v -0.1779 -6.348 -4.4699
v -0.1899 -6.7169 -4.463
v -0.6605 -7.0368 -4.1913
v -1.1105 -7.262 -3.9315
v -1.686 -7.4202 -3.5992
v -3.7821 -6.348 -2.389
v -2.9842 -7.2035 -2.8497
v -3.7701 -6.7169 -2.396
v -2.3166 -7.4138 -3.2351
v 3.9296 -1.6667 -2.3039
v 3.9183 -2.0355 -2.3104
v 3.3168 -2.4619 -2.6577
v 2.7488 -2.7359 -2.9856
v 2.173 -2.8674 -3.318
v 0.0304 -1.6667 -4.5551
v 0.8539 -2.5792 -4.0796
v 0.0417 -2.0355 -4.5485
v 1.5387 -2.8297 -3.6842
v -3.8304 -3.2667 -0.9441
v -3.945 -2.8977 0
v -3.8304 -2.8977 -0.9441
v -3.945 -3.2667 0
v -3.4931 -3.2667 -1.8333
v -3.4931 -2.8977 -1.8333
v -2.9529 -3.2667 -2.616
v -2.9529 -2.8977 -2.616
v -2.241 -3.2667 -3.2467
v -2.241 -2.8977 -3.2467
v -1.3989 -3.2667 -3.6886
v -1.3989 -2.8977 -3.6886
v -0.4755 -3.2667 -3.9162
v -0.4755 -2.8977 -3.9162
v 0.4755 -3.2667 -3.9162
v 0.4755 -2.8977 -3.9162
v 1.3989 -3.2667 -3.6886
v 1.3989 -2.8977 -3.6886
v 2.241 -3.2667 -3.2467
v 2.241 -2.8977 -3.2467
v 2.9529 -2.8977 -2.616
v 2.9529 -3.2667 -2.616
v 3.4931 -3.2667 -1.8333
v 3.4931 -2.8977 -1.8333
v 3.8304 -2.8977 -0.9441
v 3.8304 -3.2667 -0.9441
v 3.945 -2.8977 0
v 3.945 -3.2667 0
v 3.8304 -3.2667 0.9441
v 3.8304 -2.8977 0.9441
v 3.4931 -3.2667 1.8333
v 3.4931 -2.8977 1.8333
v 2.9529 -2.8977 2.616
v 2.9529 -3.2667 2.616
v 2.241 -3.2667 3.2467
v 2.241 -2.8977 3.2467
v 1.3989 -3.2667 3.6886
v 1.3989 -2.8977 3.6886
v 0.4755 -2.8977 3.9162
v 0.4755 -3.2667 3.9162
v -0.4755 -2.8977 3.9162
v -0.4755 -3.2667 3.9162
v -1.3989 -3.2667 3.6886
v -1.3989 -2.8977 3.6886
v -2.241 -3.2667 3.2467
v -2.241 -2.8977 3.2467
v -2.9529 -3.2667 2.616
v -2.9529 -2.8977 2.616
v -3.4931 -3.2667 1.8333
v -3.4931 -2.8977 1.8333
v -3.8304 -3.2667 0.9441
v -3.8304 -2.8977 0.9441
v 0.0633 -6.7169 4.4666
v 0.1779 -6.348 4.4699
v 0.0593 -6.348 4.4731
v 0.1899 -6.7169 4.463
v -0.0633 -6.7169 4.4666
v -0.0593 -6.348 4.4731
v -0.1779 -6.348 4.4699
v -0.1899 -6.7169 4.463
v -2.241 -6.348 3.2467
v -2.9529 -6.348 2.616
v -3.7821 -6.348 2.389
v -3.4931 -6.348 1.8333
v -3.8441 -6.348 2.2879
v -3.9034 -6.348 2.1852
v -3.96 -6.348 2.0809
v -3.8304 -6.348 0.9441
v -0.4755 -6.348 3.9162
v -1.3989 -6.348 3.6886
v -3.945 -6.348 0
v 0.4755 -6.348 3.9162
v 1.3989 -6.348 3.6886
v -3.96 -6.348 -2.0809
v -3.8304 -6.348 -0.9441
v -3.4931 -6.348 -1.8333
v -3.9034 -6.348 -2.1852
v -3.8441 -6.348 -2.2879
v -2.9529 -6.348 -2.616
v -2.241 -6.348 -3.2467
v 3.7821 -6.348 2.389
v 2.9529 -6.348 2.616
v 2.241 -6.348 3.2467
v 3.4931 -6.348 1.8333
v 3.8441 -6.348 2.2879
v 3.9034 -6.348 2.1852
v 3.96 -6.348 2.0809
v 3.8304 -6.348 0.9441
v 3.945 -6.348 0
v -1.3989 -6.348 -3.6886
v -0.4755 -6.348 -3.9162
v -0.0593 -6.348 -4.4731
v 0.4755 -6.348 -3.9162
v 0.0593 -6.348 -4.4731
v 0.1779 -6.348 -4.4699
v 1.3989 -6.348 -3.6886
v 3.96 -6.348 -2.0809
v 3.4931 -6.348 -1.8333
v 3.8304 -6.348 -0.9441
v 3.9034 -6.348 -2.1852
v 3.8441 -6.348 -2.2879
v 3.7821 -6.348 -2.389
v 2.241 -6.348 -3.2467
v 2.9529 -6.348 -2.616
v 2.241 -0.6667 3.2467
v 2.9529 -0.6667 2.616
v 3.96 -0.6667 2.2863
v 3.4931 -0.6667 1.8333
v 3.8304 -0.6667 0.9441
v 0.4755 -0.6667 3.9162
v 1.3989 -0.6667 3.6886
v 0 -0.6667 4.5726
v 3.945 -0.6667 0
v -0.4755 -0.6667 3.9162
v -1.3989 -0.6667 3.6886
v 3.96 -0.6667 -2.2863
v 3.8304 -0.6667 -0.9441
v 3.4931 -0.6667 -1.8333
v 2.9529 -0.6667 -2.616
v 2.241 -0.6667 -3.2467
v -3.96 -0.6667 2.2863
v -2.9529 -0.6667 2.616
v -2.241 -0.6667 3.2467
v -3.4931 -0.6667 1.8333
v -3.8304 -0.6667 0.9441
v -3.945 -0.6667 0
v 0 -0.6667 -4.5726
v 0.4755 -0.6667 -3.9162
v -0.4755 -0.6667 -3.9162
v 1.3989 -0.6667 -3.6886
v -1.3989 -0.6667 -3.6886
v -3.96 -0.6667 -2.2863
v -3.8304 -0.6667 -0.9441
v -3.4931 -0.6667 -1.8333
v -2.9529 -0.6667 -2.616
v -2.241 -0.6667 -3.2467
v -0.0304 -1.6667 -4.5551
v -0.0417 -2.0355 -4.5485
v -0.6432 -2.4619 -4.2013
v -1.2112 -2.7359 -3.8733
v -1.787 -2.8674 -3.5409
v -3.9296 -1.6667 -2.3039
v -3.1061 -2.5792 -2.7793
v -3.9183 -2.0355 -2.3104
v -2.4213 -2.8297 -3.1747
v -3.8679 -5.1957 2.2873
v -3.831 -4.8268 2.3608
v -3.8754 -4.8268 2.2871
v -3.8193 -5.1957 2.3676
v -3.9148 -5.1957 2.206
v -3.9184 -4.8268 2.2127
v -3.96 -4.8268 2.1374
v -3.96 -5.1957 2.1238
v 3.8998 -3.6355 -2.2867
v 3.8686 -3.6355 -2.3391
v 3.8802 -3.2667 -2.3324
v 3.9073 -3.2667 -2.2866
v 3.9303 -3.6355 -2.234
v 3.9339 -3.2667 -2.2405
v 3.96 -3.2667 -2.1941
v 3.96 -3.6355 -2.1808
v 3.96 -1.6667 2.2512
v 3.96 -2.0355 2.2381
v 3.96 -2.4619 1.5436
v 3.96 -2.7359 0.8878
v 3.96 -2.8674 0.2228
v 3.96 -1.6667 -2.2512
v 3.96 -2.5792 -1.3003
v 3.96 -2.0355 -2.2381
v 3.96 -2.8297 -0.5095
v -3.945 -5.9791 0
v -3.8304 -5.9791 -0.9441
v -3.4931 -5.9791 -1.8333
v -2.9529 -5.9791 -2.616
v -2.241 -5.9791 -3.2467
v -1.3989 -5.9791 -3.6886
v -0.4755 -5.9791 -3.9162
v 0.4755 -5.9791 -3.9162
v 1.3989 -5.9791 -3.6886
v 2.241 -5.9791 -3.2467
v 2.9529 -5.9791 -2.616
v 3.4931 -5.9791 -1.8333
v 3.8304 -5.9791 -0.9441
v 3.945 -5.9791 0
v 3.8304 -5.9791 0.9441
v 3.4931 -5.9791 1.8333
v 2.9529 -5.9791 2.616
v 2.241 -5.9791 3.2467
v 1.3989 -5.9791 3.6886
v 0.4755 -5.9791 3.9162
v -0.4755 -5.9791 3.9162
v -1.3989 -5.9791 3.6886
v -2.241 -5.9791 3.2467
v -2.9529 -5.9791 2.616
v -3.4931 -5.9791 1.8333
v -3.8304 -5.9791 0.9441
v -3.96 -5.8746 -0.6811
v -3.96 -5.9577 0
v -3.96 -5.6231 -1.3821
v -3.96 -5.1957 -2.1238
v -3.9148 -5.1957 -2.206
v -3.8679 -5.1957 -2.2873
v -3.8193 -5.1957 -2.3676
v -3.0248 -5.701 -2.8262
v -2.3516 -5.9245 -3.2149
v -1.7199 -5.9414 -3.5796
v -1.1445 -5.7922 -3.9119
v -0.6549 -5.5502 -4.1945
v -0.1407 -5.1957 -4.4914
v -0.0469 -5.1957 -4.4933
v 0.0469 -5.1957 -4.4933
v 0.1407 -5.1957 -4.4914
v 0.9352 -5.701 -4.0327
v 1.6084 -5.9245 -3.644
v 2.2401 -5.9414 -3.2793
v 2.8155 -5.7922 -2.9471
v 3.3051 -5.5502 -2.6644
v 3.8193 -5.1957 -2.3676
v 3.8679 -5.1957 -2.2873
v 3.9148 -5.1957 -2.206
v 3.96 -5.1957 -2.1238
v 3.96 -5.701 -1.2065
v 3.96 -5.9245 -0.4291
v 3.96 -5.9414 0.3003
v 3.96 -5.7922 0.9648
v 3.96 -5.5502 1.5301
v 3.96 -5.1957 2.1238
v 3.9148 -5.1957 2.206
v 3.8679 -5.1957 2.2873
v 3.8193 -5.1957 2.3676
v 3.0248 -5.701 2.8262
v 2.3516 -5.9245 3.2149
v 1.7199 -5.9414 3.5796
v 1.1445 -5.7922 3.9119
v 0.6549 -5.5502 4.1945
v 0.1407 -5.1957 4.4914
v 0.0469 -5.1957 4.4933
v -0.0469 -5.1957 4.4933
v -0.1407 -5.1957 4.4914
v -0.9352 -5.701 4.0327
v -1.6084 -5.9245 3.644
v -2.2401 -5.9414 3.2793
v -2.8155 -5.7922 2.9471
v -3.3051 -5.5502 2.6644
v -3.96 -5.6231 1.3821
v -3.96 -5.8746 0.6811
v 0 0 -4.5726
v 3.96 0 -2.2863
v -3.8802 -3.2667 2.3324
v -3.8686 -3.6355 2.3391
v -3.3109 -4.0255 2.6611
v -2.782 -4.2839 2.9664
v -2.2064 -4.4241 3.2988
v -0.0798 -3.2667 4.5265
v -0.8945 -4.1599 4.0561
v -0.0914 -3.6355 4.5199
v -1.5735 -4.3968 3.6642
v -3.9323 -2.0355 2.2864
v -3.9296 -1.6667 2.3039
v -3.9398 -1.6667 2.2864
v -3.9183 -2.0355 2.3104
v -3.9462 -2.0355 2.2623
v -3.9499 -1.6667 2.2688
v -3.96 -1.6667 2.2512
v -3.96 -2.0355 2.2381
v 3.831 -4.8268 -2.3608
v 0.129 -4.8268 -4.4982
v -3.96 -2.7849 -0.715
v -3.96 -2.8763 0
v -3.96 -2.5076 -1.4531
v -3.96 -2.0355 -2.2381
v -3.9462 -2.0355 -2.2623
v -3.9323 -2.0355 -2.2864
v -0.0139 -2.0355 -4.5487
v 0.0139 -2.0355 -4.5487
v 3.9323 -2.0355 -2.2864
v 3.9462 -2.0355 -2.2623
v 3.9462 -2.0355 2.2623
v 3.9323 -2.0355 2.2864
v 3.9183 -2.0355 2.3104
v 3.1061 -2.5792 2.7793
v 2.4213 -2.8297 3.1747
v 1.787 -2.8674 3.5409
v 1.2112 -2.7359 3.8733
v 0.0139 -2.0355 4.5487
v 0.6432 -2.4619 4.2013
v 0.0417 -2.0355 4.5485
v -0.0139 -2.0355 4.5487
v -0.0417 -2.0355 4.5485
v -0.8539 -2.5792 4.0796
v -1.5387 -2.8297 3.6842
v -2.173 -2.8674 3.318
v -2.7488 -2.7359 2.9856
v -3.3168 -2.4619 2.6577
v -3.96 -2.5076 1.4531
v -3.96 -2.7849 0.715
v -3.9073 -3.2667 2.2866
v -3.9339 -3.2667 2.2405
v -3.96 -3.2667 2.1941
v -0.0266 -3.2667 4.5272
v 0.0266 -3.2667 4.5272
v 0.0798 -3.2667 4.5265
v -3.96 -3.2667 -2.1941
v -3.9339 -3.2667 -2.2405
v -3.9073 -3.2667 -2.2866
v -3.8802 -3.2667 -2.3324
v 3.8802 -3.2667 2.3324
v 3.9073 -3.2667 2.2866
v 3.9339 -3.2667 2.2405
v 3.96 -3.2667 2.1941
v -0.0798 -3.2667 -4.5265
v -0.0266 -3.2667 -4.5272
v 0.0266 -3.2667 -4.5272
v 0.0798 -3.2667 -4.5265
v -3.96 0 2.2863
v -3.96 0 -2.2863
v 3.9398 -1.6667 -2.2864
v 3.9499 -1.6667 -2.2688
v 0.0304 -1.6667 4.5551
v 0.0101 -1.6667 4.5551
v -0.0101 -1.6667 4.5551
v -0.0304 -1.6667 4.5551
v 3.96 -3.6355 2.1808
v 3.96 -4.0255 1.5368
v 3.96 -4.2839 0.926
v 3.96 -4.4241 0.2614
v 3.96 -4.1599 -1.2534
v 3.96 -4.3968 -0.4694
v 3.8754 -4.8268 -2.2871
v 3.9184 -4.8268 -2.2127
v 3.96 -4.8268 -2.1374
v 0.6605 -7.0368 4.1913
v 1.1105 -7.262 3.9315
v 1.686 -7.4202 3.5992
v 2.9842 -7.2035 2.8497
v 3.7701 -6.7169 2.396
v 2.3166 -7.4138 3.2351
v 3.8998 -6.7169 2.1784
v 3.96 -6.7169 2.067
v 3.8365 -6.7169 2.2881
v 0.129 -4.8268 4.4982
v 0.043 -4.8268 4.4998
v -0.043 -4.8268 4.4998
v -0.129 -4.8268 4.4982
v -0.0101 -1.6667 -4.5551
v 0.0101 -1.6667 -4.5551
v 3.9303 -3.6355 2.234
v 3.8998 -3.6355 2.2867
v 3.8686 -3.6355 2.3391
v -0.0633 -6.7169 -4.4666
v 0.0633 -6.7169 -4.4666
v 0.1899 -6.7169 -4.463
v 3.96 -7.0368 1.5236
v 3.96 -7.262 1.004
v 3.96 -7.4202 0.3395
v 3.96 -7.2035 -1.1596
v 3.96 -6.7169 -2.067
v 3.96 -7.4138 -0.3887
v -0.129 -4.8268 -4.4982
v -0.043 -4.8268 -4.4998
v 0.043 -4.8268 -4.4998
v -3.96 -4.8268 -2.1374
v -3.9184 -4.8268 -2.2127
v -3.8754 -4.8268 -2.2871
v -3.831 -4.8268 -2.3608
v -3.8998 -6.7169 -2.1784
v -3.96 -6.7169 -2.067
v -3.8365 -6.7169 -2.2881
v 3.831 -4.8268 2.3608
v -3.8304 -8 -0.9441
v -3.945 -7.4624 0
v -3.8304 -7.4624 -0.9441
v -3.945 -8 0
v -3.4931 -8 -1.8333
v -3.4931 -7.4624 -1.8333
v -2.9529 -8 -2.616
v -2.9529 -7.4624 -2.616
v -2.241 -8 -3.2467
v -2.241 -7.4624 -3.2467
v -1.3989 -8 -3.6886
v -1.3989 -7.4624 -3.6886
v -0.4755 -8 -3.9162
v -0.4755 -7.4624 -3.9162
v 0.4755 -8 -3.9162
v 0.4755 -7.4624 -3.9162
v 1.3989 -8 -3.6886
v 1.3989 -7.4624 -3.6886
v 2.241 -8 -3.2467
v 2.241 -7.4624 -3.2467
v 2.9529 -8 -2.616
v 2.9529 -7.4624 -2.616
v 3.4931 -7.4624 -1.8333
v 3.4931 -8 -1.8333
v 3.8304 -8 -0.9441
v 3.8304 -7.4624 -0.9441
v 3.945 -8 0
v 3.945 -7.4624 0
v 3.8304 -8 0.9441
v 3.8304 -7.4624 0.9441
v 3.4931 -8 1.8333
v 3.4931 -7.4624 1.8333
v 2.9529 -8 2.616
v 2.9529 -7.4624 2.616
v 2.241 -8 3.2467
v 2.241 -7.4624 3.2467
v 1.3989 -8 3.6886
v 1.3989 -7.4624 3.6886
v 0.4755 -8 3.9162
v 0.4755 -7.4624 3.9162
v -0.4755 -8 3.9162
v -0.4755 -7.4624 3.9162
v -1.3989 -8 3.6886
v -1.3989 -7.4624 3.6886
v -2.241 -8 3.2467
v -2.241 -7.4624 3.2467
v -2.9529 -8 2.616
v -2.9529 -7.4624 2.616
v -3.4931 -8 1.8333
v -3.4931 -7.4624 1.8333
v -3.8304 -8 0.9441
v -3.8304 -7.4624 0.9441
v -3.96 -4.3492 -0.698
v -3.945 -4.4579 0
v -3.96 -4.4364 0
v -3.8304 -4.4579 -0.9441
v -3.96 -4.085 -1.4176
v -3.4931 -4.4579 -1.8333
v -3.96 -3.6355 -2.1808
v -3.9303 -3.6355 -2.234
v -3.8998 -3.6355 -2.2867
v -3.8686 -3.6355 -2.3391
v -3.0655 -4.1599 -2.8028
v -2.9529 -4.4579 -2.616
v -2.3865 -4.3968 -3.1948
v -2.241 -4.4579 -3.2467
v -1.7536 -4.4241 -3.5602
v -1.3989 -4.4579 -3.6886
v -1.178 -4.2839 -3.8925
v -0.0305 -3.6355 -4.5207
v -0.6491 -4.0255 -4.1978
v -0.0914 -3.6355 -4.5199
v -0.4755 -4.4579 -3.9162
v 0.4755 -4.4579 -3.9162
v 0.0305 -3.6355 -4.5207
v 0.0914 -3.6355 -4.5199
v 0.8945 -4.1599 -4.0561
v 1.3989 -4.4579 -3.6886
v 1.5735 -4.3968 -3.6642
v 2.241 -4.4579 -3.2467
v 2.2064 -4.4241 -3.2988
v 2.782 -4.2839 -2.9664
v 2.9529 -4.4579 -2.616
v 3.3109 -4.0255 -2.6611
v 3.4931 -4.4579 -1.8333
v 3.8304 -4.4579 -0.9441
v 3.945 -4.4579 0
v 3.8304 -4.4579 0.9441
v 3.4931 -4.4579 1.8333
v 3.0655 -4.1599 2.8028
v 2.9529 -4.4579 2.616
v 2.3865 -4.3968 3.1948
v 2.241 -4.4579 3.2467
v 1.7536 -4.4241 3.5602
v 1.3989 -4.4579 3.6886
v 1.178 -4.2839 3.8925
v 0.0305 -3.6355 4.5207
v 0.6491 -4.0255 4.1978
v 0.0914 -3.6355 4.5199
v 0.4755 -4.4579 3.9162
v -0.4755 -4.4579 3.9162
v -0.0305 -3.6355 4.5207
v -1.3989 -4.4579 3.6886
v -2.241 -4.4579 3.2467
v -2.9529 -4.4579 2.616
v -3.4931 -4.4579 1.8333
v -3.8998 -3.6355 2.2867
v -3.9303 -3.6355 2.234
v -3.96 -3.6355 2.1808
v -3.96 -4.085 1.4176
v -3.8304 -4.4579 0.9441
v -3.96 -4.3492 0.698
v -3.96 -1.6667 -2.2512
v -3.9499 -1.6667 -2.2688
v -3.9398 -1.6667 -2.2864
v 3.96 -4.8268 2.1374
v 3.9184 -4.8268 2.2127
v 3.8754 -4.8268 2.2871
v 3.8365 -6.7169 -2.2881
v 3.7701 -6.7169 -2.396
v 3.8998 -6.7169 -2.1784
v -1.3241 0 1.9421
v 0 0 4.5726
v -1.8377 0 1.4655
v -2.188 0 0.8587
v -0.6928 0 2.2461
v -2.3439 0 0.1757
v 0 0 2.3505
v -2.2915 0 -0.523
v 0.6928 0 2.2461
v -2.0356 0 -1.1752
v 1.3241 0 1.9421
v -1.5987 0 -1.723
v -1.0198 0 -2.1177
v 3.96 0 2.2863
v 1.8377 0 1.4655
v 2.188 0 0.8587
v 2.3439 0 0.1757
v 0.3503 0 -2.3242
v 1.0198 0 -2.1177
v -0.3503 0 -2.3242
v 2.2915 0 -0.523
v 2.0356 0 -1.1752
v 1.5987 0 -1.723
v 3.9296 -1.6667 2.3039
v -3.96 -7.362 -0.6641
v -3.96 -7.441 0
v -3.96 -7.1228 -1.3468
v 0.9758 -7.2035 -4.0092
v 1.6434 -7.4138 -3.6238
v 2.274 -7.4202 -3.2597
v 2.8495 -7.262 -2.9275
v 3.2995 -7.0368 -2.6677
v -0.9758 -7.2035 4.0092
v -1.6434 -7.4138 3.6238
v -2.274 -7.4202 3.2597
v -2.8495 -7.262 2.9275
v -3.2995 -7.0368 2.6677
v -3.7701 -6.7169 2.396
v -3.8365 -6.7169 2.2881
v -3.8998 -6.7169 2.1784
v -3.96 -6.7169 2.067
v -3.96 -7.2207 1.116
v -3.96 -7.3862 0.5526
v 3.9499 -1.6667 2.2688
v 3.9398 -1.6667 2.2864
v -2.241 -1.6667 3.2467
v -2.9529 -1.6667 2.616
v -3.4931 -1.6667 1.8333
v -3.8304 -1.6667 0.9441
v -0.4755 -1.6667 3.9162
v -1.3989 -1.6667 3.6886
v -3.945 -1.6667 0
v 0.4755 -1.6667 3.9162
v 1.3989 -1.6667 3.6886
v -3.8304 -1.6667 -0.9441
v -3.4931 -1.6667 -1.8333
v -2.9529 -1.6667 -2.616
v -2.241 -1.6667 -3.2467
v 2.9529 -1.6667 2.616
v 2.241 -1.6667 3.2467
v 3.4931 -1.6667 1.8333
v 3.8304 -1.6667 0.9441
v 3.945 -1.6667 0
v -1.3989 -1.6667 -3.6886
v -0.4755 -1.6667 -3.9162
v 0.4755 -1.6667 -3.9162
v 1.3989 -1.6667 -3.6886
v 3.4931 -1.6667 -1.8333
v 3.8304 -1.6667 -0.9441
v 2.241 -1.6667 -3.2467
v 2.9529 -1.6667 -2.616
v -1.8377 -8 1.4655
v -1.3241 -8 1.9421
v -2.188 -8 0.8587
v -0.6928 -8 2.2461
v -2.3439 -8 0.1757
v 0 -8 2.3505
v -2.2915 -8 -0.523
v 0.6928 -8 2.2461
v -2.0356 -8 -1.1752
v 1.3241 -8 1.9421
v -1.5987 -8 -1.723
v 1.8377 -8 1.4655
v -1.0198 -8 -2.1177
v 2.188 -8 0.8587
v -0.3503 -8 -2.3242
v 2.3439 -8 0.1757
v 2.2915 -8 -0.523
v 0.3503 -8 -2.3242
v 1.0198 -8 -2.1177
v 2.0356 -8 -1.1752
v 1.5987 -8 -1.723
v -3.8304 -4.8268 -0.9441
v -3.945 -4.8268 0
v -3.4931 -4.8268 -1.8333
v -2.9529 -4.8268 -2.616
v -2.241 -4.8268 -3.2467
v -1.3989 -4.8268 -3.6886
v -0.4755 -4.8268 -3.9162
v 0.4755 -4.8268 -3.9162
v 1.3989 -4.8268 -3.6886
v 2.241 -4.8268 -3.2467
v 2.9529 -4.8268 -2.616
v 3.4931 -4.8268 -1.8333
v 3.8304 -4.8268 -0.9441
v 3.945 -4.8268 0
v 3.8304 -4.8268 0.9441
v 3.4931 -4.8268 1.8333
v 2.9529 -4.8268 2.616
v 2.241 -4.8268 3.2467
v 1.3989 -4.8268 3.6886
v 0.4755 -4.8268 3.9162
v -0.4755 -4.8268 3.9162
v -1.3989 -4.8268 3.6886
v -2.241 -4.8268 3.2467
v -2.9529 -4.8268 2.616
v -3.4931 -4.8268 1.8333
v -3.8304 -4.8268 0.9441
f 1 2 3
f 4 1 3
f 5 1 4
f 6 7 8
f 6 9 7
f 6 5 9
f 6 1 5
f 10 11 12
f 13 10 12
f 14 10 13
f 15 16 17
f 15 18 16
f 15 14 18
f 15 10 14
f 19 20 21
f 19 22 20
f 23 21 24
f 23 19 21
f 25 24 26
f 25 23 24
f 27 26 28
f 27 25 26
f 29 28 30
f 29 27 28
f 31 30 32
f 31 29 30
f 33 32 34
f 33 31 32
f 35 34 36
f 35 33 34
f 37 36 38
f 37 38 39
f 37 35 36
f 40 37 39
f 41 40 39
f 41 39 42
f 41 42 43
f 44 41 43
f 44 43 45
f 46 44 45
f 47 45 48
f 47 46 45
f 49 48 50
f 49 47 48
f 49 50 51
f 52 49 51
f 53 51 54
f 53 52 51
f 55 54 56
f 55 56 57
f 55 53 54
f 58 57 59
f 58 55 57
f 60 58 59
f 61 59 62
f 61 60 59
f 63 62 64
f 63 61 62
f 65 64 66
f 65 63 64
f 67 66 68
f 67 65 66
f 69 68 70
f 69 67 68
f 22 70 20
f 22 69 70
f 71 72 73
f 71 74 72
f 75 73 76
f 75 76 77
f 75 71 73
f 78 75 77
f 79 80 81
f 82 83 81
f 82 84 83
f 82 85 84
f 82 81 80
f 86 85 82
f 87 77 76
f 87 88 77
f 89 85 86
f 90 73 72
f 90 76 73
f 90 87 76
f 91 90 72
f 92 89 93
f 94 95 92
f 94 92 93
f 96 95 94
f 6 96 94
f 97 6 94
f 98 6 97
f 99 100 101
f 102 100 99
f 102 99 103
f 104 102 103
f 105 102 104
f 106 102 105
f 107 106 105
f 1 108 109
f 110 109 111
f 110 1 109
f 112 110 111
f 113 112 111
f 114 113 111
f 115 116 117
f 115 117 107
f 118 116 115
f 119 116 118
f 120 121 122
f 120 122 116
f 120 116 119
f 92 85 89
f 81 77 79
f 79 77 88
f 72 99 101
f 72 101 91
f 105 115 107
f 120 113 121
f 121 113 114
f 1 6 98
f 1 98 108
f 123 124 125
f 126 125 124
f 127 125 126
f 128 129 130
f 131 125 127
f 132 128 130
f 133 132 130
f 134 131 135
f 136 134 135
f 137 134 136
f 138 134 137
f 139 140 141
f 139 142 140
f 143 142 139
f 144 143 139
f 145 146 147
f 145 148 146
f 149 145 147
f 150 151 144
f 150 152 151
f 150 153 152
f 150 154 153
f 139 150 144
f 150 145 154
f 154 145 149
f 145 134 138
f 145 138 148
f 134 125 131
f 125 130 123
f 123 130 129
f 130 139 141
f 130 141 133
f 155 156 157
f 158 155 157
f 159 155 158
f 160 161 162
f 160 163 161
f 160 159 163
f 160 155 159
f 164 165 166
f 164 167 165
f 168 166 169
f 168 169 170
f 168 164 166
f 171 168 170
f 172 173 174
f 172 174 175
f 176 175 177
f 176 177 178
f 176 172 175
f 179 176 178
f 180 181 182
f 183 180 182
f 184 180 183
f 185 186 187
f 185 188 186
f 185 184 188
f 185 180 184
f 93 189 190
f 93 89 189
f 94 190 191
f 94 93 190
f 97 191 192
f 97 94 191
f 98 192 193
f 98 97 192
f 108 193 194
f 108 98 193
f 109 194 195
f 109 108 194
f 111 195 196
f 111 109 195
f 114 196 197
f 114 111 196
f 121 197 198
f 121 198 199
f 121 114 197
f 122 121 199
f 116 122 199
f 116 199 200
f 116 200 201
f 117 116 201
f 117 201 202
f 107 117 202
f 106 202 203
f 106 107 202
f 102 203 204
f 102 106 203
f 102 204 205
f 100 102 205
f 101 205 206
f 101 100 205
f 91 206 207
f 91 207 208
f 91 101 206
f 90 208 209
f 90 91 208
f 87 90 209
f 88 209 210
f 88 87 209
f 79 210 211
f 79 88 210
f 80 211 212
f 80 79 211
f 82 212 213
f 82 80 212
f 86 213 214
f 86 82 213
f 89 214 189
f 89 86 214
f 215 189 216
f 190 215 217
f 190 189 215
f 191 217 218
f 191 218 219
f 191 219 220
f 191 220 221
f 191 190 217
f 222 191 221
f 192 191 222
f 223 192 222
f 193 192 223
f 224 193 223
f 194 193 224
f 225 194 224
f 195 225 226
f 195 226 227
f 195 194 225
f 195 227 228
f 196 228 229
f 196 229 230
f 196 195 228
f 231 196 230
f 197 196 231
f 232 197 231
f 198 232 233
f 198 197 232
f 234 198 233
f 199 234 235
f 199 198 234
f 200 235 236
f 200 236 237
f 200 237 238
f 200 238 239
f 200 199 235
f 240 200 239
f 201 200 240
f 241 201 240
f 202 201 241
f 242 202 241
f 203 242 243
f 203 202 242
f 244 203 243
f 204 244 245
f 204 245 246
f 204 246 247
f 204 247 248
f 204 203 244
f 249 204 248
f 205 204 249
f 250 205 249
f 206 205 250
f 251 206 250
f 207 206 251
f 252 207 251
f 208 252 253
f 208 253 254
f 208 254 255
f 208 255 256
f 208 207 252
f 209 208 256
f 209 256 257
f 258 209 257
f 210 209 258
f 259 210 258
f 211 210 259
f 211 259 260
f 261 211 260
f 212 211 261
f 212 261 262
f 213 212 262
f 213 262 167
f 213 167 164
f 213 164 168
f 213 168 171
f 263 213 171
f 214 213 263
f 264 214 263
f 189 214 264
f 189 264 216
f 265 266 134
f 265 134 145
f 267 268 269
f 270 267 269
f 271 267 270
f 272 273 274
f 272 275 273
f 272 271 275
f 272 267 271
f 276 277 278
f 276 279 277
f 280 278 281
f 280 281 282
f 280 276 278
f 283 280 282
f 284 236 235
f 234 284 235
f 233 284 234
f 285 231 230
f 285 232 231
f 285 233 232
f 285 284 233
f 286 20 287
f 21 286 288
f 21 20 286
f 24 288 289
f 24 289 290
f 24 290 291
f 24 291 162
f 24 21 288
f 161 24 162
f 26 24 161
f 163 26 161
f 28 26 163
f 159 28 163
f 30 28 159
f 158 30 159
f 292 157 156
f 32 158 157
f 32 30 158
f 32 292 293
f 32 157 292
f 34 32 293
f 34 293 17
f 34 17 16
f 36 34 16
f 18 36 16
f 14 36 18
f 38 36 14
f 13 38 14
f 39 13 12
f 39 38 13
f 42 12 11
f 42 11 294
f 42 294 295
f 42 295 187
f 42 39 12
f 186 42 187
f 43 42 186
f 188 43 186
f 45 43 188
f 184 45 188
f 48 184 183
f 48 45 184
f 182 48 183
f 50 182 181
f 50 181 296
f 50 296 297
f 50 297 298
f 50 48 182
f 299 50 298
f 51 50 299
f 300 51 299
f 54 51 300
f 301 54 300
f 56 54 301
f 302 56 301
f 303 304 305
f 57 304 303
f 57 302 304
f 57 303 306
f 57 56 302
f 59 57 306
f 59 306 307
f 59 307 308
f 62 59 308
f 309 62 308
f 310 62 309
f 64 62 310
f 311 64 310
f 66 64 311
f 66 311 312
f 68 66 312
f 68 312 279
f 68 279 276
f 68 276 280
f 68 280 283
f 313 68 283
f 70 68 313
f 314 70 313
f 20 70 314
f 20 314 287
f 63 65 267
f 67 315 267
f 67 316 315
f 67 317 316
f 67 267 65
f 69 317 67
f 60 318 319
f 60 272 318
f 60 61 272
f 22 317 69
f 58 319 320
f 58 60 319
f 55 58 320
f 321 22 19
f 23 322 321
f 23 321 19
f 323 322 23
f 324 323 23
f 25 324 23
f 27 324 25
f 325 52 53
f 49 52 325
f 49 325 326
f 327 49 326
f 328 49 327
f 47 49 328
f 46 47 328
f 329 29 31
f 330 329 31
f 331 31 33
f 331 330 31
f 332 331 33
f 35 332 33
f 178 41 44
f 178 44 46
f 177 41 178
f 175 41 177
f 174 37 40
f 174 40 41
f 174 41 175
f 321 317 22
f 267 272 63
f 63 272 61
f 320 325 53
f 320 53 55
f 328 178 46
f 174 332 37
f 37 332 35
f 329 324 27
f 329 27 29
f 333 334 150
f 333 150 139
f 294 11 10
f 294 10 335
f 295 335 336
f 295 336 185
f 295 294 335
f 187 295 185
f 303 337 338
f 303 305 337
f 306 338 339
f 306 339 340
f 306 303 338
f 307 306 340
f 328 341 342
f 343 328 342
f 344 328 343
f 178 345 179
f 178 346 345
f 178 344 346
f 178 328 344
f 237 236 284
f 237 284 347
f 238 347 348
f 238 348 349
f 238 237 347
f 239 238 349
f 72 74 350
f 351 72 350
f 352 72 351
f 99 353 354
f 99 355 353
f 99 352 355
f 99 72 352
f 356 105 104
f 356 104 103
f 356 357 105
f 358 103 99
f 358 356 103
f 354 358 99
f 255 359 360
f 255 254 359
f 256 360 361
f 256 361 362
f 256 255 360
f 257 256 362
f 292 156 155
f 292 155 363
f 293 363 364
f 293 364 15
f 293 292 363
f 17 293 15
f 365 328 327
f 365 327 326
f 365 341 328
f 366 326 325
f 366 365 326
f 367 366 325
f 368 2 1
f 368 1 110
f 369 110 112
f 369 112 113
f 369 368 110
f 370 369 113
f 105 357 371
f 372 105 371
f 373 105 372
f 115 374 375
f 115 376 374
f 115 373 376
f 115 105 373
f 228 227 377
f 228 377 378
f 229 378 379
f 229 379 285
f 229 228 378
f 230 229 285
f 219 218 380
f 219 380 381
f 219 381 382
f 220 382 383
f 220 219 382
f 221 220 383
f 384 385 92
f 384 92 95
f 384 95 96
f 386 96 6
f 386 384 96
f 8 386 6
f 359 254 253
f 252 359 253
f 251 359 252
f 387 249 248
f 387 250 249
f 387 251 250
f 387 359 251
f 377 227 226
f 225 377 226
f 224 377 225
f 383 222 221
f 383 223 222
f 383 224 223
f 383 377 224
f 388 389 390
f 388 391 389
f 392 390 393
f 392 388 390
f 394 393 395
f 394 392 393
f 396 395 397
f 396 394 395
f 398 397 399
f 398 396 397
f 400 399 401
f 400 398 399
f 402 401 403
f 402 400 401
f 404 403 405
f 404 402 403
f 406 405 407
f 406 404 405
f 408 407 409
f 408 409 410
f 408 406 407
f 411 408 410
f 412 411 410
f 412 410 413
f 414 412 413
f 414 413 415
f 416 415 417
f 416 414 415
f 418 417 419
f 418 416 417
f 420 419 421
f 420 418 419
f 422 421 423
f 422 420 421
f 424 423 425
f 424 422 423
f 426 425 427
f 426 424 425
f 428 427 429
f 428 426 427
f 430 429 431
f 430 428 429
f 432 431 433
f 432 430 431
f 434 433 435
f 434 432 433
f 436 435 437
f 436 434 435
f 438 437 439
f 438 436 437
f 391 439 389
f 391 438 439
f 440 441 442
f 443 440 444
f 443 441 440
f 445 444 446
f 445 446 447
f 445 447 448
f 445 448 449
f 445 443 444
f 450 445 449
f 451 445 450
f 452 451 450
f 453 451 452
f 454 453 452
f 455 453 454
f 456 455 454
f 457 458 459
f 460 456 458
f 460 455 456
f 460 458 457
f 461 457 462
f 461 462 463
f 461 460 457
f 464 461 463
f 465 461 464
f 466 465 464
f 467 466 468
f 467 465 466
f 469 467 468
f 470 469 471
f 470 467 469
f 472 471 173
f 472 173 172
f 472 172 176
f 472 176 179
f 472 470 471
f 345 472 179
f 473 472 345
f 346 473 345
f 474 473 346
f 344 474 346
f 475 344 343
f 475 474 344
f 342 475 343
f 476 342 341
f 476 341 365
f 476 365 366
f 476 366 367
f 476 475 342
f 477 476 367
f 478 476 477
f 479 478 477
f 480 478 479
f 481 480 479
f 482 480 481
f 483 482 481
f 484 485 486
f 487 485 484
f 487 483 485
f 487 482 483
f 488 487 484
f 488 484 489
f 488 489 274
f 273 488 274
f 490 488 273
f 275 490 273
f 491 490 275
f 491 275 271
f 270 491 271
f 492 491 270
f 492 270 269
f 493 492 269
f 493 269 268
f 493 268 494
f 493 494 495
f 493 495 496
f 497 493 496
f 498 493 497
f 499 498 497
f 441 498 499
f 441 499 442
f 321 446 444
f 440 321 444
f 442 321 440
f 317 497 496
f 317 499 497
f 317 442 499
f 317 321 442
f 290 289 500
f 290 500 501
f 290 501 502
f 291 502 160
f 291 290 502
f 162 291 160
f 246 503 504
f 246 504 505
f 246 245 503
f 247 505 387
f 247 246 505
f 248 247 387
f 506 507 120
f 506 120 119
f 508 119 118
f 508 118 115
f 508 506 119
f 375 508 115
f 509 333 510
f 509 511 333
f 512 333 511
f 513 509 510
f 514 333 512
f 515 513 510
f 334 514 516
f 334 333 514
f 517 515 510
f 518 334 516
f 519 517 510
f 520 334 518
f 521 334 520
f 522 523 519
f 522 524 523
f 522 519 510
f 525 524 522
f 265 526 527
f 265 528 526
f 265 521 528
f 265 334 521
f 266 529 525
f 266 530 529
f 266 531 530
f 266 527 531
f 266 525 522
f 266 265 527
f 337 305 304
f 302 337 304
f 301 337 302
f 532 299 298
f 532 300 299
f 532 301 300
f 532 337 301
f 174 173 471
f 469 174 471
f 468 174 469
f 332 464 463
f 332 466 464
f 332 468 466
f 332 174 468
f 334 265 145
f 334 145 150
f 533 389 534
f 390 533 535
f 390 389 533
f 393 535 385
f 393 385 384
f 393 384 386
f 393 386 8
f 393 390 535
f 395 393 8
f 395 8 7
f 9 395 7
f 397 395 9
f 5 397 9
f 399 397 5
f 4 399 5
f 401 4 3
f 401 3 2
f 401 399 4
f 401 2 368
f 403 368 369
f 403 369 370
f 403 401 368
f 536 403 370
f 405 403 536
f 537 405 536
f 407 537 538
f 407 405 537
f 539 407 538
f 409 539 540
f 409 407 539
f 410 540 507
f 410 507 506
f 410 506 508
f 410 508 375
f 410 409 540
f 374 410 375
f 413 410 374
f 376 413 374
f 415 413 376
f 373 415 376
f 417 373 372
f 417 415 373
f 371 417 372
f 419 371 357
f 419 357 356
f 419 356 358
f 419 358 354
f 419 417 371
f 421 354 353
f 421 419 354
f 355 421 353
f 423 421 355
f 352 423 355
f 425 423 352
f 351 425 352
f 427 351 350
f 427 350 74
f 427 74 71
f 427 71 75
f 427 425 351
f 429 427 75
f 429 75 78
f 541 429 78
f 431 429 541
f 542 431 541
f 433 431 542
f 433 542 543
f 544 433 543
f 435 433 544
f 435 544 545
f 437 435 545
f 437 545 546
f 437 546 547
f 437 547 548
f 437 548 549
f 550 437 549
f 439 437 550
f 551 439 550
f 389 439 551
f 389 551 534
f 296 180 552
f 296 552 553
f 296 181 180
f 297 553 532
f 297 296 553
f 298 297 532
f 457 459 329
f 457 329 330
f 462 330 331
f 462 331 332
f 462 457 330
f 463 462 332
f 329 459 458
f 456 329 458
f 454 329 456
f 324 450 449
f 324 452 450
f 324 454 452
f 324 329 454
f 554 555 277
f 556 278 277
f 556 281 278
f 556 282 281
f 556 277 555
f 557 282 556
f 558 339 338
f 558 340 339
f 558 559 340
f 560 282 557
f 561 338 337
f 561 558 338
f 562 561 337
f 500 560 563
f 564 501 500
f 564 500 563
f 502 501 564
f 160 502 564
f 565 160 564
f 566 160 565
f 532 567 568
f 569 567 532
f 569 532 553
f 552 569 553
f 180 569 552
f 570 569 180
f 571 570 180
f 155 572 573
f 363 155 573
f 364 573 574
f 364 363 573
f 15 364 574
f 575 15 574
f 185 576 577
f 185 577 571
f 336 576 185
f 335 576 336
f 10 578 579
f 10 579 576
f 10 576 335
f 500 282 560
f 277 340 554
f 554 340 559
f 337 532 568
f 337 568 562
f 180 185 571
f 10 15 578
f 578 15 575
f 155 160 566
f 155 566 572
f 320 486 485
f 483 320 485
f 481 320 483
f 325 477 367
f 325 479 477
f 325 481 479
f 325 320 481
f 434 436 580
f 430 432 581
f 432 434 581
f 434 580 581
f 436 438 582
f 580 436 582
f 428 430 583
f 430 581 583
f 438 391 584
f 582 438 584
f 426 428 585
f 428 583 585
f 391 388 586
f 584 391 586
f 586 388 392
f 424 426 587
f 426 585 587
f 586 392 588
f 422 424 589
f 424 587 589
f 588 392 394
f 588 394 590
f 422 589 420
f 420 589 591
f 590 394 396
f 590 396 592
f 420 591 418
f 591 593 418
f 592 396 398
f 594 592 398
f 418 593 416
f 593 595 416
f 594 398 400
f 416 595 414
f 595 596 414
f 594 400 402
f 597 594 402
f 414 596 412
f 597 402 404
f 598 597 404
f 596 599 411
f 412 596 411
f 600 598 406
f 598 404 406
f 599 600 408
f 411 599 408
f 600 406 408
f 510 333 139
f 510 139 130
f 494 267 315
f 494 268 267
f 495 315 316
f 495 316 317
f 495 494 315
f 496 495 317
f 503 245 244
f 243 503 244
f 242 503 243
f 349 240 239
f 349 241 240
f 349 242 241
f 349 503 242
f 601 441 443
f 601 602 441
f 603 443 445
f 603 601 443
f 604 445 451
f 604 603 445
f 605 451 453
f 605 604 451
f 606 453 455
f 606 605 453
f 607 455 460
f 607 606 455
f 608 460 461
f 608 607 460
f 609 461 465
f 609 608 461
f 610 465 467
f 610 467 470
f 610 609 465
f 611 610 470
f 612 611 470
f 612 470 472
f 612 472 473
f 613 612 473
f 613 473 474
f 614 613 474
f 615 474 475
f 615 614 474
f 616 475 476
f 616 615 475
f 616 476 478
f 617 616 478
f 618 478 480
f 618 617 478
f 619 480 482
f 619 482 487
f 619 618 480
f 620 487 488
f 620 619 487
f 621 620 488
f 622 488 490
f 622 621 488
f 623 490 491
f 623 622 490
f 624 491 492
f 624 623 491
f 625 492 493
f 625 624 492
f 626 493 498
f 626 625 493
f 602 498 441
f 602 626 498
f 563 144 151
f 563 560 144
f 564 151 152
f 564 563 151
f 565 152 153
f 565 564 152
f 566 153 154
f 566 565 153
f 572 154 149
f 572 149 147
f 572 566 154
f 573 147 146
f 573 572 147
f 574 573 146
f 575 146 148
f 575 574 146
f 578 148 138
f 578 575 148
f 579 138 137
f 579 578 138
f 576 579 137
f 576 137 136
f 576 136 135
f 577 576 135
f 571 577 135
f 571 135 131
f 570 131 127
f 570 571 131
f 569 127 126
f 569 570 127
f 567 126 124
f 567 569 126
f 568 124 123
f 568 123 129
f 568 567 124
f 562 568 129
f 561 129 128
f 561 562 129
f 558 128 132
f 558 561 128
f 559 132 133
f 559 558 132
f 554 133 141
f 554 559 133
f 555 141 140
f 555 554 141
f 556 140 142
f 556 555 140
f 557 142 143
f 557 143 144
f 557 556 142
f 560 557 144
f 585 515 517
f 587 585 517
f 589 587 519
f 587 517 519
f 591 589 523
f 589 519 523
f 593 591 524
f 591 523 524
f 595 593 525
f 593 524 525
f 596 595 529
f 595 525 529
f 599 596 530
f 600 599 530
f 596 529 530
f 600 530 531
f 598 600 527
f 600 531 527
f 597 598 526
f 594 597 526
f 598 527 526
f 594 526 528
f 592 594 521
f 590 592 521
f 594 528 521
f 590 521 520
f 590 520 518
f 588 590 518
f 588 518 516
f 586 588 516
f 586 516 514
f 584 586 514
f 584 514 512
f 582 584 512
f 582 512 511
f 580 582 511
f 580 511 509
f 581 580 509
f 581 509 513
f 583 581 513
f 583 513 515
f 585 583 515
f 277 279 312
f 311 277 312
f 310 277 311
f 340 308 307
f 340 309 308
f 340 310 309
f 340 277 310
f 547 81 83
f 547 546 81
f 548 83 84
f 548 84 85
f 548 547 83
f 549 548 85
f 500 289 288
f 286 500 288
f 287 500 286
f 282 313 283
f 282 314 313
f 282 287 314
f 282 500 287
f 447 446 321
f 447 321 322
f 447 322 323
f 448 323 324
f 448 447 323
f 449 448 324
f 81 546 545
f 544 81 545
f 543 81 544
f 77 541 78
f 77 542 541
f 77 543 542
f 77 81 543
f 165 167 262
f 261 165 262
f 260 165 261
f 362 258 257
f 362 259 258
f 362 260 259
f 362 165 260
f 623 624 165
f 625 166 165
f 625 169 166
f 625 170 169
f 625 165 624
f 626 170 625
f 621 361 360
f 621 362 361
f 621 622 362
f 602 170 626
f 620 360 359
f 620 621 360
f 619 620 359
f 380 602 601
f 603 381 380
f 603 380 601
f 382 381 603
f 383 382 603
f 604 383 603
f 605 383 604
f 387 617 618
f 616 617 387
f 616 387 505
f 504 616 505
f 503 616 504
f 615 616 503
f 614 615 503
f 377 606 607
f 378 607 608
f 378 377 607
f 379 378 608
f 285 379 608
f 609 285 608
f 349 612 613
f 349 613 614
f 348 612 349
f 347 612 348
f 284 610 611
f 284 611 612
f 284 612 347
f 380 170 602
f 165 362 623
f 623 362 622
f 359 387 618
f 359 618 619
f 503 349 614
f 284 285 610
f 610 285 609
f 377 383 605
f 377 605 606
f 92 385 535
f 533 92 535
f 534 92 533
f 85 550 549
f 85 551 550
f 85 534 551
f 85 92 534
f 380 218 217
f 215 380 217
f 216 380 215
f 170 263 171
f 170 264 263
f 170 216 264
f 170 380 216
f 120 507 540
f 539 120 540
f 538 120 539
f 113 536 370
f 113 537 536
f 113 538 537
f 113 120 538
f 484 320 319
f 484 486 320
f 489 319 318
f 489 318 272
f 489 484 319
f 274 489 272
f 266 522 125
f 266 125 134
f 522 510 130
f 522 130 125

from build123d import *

# Parameters (mm, degrees)
EXTRUDE1_DEPTH = 8
SKETCH4_R      = 2.350480947
EXTRUDE2_DEPTH = 11.029476557


with BuildPart() as part:
    # Sketch1 → Extrude1 (new body)
    with BuildSketch(Plane(origin=(0, 0, 0), x_dir=(1, 0, 0), z_dir=(0, 1, 0))):
        Polygon((0, 4.572614132), (-3.96, 2.286307066), (-3.96, -2.286307066), (0, -4.572614132), (3.96, -2.286307066), (3.96, 2.286307066), align=None)
    extrude(amount=-EXTRUDE1_DEPTH)

    # Sketch4 → Extrude2 (cut, through all)
    with BuildSketch(Plane(origin=(0, 0, 0), x_dir=(-1, 0, 0), z_dir=(0, 1, 0))):
        Circle(SKETCH4_R)
    extrude(amount=-EXTRUDE2_DEPTH, mode=Mode.SUBTRACT)

    # Sketch5 → Cut-Revolve1 (revolve, cut)
    with BuildSketch(Plane.XY):
        Polygon((-3.945, -8), (-4.572614132, -8), (-5.200228264, -8), (-5.200228264, 0), (-4.572614132, 0), (-4.572614132, -0.666666667), (-3.945, -0.666666667), (-3.945, -1.666666667), (-4.555159067, -1.666666667), (-4.548720402, -2.035537527), (-3.945, -2.897739617), (-3.945, -3.266666667), (-4.527230963, -3.266666667), (-4.520792298, -3.635537527), (-3.945, -4.457854151), (-3.945, -4.826781201), (-4.499999063, -4.826781201), (-4.493560398, -5.195652062), (-3.945, -5.9790775), (-3.945, -6.34800455), (-4.47344601, -6.34800455), (-4.467007346, -6.716875411), (-3.945, -7.462379161), align=None)
    revolve(axis=Axis((0, 0, 0), (0, -1, 0)), mode=Mode.SUBTRACT)


solid = part.part
